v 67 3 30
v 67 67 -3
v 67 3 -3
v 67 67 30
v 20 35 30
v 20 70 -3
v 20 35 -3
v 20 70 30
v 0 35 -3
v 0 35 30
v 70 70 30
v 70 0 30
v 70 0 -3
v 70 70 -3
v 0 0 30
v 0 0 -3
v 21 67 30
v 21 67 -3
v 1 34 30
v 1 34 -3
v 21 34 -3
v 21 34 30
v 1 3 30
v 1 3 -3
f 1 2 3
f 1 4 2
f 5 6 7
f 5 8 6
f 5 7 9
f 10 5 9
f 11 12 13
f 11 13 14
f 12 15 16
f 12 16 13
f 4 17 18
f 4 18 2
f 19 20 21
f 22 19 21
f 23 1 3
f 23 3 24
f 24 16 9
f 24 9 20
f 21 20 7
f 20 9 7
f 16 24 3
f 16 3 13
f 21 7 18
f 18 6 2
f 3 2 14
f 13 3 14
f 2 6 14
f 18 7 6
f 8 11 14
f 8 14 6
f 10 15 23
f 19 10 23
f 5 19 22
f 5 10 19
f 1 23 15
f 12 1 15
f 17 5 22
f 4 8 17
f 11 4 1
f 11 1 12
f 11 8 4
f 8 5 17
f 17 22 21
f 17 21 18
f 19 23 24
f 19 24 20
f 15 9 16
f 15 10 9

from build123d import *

# Parameters (mm, degrees)
F1_DEPTH      = 30
F1_DEPTH_BACK = 3


with BuildPart() as f1:
    # F0 (on Top) → F1 (new body, two sides)
    with BuildSketch(Plane.XY) as f1_sk:
        Polygon((0, 35), (0, 0), (3, 0), (70, 0), (70, 70), (20, 70), (20, 35), align=None)
        Polygon((67, 3), (3, 3), (1, 3), (1, 34), (21, 34), (21, 67), (67, 67), align=None, mode=Mode.SUBTRACT)
    extrude(amount=F1_DEPTH)
    extrude(f1_sk.sketch, amount=-F1_DEPTH_BACK)


solid = f1.part
